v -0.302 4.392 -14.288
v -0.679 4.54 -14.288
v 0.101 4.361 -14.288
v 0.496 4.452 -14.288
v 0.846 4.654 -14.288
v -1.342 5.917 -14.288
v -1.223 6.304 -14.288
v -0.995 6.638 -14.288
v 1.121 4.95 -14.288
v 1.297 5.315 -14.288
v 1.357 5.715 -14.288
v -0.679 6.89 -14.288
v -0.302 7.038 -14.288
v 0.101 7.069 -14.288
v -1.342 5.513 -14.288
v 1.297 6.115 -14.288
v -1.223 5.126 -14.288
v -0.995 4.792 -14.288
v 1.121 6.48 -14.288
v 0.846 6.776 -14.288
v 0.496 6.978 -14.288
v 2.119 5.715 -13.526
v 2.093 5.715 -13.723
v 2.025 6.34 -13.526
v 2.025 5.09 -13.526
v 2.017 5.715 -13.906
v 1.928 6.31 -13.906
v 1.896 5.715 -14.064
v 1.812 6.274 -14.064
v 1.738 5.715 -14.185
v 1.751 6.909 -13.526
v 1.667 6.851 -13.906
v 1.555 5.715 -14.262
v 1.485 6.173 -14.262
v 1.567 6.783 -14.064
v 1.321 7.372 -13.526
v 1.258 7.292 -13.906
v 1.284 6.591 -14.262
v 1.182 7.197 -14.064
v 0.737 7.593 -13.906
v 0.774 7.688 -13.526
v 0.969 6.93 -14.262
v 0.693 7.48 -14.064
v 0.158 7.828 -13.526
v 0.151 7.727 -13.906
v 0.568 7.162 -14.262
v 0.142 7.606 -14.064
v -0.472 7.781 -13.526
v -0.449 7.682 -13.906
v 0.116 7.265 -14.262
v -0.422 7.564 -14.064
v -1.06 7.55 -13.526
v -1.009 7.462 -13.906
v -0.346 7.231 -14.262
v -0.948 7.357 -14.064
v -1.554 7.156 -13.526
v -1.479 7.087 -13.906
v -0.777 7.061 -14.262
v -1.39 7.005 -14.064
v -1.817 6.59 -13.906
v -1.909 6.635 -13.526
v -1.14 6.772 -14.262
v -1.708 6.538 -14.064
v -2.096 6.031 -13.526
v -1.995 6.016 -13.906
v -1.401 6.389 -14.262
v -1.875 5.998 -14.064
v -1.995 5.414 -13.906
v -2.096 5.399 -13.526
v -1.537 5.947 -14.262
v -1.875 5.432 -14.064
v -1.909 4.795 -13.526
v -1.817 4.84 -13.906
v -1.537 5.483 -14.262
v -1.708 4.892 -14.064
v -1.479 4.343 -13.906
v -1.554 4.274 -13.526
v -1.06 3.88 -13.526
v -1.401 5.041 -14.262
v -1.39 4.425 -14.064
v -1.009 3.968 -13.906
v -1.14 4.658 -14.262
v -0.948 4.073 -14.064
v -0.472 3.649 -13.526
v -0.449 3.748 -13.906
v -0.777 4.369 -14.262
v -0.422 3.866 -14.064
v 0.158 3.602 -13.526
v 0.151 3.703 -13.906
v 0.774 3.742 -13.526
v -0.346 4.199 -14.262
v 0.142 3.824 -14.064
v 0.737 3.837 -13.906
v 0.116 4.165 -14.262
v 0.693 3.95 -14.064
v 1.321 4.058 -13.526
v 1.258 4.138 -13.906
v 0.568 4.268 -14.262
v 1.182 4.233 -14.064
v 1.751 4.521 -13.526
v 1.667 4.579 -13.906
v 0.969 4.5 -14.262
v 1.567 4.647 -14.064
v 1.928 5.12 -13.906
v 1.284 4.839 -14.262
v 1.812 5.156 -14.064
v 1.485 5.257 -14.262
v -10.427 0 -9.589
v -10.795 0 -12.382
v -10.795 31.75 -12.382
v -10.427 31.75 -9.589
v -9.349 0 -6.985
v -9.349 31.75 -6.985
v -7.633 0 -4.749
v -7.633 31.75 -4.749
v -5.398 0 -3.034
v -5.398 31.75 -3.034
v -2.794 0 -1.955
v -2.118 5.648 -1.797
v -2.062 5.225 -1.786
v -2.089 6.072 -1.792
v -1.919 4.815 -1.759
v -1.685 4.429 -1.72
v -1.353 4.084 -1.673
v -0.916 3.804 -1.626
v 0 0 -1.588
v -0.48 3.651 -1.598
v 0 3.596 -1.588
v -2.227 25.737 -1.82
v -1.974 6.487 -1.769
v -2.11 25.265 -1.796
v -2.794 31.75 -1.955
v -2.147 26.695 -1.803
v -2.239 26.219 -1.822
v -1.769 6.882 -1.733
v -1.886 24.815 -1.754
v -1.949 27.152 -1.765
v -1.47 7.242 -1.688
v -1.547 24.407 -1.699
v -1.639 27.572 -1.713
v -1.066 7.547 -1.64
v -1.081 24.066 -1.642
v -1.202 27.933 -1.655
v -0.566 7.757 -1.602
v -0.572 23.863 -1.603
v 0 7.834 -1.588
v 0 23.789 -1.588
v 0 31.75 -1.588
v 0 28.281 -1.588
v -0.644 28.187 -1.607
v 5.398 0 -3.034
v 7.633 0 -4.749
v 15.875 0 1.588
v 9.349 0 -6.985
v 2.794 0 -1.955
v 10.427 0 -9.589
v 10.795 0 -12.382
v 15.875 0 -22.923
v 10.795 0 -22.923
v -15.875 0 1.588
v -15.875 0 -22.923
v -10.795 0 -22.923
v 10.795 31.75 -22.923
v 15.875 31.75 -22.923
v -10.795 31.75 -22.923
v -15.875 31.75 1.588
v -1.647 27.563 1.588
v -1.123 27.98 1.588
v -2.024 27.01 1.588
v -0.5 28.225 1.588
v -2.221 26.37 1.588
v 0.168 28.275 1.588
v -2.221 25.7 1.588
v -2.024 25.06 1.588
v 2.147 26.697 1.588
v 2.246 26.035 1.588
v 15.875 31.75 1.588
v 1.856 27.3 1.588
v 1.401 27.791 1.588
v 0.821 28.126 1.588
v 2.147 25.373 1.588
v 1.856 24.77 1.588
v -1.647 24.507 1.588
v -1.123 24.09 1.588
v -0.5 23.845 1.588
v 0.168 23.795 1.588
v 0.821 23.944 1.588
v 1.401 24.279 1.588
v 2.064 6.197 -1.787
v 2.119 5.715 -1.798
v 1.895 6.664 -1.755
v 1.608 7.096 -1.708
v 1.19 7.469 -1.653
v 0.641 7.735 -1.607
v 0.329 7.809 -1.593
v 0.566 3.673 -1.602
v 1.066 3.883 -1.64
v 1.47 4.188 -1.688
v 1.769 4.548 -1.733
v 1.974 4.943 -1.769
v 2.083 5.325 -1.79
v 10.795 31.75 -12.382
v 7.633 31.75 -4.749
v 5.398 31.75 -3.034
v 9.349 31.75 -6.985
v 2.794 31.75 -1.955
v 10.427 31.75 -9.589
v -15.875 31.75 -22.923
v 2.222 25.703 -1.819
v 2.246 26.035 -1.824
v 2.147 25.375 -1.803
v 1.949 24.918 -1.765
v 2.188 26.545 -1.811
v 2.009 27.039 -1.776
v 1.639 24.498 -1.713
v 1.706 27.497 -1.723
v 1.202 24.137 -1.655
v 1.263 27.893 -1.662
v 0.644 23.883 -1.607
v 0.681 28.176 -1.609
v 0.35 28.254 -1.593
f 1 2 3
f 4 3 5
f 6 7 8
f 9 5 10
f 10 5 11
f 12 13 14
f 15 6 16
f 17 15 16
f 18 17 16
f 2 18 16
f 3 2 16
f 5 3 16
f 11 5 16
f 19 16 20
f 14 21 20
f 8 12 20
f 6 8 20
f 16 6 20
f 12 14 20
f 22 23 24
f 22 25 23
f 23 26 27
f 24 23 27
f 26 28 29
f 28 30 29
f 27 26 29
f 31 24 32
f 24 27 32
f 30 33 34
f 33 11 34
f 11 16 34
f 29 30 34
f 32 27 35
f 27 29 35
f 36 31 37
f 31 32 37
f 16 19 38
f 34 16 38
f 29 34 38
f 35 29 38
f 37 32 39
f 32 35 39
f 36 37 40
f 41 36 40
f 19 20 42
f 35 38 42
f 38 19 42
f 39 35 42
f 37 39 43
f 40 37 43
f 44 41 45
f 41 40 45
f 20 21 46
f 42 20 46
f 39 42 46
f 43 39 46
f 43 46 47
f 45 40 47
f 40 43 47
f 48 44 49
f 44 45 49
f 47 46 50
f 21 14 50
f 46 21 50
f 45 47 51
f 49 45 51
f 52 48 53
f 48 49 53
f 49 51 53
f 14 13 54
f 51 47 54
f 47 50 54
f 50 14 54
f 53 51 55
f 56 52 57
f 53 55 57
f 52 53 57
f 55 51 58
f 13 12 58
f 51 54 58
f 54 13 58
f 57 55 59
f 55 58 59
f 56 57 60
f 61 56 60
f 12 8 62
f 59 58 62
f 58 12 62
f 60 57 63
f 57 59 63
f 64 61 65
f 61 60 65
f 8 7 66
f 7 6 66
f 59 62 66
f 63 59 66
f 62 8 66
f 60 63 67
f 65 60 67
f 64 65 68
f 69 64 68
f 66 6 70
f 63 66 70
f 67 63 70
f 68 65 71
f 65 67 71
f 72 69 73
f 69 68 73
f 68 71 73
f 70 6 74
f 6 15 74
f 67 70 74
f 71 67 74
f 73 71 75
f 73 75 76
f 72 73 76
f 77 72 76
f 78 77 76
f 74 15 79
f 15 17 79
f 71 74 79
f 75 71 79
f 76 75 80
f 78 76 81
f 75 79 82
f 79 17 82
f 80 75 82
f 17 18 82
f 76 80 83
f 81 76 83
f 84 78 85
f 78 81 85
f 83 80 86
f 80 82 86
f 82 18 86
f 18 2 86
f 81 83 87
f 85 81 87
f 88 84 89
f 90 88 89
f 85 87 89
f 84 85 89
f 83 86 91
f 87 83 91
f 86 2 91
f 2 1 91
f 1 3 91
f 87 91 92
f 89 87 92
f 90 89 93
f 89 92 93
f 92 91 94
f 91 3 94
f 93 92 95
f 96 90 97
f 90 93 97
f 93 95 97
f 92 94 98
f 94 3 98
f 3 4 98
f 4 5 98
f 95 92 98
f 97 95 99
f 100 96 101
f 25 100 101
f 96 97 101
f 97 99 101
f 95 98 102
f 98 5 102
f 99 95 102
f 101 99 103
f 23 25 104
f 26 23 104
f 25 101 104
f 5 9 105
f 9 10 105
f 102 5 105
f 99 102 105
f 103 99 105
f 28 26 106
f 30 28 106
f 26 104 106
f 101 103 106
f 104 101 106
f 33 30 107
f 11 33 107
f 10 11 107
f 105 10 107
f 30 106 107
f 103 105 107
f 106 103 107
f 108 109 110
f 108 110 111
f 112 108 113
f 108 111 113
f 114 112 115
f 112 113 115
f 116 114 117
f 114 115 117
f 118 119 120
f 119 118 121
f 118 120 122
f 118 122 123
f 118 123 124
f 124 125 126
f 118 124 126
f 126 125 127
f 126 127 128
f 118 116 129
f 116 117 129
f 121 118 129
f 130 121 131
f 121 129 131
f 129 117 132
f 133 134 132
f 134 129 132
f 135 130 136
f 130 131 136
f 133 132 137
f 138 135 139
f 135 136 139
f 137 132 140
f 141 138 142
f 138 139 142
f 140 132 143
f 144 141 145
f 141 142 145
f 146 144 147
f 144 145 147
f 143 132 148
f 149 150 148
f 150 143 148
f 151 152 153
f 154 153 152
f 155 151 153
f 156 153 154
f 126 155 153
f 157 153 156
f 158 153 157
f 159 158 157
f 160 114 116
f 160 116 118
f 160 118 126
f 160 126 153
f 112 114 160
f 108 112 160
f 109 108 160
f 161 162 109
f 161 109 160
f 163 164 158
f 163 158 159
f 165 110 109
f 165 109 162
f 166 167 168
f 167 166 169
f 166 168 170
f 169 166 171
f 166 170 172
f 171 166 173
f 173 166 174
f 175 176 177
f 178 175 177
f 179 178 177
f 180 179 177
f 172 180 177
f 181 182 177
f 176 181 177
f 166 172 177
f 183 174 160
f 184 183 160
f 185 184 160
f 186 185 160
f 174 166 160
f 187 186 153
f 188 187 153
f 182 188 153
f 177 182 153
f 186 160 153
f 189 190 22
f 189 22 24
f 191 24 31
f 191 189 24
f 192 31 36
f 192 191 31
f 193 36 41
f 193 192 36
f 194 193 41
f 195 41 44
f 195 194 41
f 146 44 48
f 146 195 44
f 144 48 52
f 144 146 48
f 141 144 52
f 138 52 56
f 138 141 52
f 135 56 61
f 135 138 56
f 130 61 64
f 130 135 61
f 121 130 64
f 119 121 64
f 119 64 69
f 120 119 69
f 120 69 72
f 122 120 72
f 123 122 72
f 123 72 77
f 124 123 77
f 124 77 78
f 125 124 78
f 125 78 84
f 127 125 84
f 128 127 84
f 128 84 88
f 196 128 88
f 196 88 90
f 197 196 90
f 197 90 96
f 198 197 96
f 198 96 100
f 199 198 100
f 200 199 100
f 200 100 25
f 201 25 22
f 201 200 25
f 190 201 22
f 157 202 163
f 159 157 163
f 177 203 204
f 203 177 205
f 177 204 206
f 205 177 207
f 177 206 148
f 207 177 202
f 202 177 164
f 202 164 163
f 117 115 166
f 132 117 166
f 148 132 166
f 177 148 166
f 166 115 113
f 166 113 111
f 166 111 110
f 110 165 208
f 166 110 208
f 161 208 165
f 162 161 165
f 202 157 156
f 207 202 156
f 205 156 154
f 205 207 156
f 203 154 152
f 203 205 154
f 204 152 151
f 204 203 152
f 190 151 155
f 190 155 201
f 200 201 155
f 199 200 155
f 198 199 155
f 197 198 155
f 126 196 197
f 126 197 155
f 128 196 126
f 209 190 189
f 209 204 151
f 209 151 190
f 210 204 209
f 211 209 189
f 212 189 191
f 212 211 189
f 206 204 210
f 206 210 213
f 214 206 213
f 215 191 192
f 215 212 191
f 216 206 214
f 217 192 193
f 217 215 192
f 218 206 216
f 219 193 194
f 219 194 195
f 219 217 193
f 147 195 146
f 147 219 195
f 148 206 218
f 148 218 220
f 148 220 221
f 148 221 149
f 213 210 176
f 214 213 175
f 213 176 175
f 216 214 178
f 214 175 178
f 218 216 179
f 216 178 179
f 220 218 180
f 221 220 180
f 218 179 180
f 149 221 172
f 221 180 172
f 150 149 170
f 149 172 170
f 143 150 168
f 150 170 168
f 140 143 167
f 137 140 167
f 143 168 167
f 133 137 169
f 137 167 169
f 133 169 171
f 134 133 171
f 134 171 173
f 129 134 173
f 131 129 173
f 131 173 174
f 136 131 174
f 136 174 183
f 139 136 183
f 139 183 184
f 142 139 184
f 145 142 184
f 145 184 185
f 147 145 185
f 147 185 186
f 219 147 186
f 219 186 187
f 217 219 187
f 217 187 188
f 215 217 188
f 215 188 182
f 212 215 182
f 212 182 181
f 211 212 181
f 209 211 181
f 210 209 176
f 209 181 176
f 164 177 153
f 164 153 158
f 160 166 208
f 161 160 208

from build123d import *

# Parameters (mm, degrees)
SKETCH1_W           = 31.75
SKETCH1_H           = 3.175
BOSS_EXTRUDE1_DEPTH = 31.75
BOSS_EXTRUDE2_DEPTH = 31.75
SKETCH3_W           = 5.08
SKETCH3_H           = 10.541
BOSS_EXTRUDE3_DEPTH = 31.75
SKETCH4_R           = 2.2463125
SKETCH4_R_2         = 2.1193125
CUT_EXTRUDE1_DEPTH  = 31.75
SKETCH6_R           = 2.1193125
BOSS_EXTRUDE4_DEPTH = 15.875
FILLET1_R           = 0.762


with BuildPart() as part:
    # Sketch1 → Boss-Extrude1 (new body)
    with BuildSketch(Plane(origin=(0, 0, 0), x_dir=(1, 0, 0), z_dir=(0, 1, 0))):
        Rectangle(SKETCH1_W, SKETCH1_H)
    extrude(amount=BOSS_EXTRUDE1_DEPTH)

    # Sketch2 → Boss-Extrude2 (add)
    with BuildSketch(Plane(origin=(0, 31.75, 0), x_dir=(1, 0, 0), z_dir=(0, 1, 0))):
        with BuildLine():
            Line((-15.875, 1.5875), (-15.875, 12.3825))
            Line((-15.875, 12.3825), (-10.795, 12.3825))
            ThreePointArc((-10.795, 12.3825), (-7.633217703, 4.749282297), (0, 1.5875))
            Line((0, 1.5875), (-15.875, 1.5875))
        make_face()
    boss_extrude2 = extrude(amount=-BOSS_EXTRUDE2_DEPTH)

    # Mirror1: Boss-Extrude2 across plane
    add(boss_extrude2.mirror(Plane(origin=(0, 0, 0), x_dir=(0, 0, 1), z_dir=(1, 0, 0))))

    # Sketch3 → Boss-Extrude3 (add)
    with BuildSketch(Plane(origin=(0, 31.75, 0), x_dir=(1, 0, 0), z_dir=(0, 1, 0))):
        with Locations((-13.335, 17.653)):
            Rectangle(SKETCH3_W, SKETCH3_H)
    boss_extrude3 = extrude(amount=-BOSS_EXTRUDE3_DEPTH)

    # Mirror2: Boss-Extrude3 across plane
    add(boss_extrude3.mirror(Plane(origin=(0, 0, 0), x_dir=(0, 0, 1), z_dir=(1, 0, 0))))

    # Sketch4 → Cut-Extrude1 (cut)
    with BuildSketch(Plane.XY.offset(1.5875)):
        with Locations((0, 26.035)):
            Circle(SKETCH4_R)
        with Locations((0, 5.715)):
            Circle(SKETCH4_R_2)
    extrude(amount=-CUT_EXTRUDE1_DEPTH, mode=Mode.SUBTRACT)

    # Sketch6 → Boss-Extrude4 (add)
    with BuildSketch(Plane.XY.offset(1.5875)):
        with Locations((0, 5.715)):
            Circle(SKETCH6_R)
    extrude(amount=-BOSS_EXTRUDE4_DEPTH)

    # Fillet1
    fillet1_edges = [part.edges().sort_by_distance(p)[0] for p in [
        (-2.1193125, 5.715, -14.2875),
    ]]
    fillet(fillet1_edges, radius=FILLET1_R)


solid = part.part
